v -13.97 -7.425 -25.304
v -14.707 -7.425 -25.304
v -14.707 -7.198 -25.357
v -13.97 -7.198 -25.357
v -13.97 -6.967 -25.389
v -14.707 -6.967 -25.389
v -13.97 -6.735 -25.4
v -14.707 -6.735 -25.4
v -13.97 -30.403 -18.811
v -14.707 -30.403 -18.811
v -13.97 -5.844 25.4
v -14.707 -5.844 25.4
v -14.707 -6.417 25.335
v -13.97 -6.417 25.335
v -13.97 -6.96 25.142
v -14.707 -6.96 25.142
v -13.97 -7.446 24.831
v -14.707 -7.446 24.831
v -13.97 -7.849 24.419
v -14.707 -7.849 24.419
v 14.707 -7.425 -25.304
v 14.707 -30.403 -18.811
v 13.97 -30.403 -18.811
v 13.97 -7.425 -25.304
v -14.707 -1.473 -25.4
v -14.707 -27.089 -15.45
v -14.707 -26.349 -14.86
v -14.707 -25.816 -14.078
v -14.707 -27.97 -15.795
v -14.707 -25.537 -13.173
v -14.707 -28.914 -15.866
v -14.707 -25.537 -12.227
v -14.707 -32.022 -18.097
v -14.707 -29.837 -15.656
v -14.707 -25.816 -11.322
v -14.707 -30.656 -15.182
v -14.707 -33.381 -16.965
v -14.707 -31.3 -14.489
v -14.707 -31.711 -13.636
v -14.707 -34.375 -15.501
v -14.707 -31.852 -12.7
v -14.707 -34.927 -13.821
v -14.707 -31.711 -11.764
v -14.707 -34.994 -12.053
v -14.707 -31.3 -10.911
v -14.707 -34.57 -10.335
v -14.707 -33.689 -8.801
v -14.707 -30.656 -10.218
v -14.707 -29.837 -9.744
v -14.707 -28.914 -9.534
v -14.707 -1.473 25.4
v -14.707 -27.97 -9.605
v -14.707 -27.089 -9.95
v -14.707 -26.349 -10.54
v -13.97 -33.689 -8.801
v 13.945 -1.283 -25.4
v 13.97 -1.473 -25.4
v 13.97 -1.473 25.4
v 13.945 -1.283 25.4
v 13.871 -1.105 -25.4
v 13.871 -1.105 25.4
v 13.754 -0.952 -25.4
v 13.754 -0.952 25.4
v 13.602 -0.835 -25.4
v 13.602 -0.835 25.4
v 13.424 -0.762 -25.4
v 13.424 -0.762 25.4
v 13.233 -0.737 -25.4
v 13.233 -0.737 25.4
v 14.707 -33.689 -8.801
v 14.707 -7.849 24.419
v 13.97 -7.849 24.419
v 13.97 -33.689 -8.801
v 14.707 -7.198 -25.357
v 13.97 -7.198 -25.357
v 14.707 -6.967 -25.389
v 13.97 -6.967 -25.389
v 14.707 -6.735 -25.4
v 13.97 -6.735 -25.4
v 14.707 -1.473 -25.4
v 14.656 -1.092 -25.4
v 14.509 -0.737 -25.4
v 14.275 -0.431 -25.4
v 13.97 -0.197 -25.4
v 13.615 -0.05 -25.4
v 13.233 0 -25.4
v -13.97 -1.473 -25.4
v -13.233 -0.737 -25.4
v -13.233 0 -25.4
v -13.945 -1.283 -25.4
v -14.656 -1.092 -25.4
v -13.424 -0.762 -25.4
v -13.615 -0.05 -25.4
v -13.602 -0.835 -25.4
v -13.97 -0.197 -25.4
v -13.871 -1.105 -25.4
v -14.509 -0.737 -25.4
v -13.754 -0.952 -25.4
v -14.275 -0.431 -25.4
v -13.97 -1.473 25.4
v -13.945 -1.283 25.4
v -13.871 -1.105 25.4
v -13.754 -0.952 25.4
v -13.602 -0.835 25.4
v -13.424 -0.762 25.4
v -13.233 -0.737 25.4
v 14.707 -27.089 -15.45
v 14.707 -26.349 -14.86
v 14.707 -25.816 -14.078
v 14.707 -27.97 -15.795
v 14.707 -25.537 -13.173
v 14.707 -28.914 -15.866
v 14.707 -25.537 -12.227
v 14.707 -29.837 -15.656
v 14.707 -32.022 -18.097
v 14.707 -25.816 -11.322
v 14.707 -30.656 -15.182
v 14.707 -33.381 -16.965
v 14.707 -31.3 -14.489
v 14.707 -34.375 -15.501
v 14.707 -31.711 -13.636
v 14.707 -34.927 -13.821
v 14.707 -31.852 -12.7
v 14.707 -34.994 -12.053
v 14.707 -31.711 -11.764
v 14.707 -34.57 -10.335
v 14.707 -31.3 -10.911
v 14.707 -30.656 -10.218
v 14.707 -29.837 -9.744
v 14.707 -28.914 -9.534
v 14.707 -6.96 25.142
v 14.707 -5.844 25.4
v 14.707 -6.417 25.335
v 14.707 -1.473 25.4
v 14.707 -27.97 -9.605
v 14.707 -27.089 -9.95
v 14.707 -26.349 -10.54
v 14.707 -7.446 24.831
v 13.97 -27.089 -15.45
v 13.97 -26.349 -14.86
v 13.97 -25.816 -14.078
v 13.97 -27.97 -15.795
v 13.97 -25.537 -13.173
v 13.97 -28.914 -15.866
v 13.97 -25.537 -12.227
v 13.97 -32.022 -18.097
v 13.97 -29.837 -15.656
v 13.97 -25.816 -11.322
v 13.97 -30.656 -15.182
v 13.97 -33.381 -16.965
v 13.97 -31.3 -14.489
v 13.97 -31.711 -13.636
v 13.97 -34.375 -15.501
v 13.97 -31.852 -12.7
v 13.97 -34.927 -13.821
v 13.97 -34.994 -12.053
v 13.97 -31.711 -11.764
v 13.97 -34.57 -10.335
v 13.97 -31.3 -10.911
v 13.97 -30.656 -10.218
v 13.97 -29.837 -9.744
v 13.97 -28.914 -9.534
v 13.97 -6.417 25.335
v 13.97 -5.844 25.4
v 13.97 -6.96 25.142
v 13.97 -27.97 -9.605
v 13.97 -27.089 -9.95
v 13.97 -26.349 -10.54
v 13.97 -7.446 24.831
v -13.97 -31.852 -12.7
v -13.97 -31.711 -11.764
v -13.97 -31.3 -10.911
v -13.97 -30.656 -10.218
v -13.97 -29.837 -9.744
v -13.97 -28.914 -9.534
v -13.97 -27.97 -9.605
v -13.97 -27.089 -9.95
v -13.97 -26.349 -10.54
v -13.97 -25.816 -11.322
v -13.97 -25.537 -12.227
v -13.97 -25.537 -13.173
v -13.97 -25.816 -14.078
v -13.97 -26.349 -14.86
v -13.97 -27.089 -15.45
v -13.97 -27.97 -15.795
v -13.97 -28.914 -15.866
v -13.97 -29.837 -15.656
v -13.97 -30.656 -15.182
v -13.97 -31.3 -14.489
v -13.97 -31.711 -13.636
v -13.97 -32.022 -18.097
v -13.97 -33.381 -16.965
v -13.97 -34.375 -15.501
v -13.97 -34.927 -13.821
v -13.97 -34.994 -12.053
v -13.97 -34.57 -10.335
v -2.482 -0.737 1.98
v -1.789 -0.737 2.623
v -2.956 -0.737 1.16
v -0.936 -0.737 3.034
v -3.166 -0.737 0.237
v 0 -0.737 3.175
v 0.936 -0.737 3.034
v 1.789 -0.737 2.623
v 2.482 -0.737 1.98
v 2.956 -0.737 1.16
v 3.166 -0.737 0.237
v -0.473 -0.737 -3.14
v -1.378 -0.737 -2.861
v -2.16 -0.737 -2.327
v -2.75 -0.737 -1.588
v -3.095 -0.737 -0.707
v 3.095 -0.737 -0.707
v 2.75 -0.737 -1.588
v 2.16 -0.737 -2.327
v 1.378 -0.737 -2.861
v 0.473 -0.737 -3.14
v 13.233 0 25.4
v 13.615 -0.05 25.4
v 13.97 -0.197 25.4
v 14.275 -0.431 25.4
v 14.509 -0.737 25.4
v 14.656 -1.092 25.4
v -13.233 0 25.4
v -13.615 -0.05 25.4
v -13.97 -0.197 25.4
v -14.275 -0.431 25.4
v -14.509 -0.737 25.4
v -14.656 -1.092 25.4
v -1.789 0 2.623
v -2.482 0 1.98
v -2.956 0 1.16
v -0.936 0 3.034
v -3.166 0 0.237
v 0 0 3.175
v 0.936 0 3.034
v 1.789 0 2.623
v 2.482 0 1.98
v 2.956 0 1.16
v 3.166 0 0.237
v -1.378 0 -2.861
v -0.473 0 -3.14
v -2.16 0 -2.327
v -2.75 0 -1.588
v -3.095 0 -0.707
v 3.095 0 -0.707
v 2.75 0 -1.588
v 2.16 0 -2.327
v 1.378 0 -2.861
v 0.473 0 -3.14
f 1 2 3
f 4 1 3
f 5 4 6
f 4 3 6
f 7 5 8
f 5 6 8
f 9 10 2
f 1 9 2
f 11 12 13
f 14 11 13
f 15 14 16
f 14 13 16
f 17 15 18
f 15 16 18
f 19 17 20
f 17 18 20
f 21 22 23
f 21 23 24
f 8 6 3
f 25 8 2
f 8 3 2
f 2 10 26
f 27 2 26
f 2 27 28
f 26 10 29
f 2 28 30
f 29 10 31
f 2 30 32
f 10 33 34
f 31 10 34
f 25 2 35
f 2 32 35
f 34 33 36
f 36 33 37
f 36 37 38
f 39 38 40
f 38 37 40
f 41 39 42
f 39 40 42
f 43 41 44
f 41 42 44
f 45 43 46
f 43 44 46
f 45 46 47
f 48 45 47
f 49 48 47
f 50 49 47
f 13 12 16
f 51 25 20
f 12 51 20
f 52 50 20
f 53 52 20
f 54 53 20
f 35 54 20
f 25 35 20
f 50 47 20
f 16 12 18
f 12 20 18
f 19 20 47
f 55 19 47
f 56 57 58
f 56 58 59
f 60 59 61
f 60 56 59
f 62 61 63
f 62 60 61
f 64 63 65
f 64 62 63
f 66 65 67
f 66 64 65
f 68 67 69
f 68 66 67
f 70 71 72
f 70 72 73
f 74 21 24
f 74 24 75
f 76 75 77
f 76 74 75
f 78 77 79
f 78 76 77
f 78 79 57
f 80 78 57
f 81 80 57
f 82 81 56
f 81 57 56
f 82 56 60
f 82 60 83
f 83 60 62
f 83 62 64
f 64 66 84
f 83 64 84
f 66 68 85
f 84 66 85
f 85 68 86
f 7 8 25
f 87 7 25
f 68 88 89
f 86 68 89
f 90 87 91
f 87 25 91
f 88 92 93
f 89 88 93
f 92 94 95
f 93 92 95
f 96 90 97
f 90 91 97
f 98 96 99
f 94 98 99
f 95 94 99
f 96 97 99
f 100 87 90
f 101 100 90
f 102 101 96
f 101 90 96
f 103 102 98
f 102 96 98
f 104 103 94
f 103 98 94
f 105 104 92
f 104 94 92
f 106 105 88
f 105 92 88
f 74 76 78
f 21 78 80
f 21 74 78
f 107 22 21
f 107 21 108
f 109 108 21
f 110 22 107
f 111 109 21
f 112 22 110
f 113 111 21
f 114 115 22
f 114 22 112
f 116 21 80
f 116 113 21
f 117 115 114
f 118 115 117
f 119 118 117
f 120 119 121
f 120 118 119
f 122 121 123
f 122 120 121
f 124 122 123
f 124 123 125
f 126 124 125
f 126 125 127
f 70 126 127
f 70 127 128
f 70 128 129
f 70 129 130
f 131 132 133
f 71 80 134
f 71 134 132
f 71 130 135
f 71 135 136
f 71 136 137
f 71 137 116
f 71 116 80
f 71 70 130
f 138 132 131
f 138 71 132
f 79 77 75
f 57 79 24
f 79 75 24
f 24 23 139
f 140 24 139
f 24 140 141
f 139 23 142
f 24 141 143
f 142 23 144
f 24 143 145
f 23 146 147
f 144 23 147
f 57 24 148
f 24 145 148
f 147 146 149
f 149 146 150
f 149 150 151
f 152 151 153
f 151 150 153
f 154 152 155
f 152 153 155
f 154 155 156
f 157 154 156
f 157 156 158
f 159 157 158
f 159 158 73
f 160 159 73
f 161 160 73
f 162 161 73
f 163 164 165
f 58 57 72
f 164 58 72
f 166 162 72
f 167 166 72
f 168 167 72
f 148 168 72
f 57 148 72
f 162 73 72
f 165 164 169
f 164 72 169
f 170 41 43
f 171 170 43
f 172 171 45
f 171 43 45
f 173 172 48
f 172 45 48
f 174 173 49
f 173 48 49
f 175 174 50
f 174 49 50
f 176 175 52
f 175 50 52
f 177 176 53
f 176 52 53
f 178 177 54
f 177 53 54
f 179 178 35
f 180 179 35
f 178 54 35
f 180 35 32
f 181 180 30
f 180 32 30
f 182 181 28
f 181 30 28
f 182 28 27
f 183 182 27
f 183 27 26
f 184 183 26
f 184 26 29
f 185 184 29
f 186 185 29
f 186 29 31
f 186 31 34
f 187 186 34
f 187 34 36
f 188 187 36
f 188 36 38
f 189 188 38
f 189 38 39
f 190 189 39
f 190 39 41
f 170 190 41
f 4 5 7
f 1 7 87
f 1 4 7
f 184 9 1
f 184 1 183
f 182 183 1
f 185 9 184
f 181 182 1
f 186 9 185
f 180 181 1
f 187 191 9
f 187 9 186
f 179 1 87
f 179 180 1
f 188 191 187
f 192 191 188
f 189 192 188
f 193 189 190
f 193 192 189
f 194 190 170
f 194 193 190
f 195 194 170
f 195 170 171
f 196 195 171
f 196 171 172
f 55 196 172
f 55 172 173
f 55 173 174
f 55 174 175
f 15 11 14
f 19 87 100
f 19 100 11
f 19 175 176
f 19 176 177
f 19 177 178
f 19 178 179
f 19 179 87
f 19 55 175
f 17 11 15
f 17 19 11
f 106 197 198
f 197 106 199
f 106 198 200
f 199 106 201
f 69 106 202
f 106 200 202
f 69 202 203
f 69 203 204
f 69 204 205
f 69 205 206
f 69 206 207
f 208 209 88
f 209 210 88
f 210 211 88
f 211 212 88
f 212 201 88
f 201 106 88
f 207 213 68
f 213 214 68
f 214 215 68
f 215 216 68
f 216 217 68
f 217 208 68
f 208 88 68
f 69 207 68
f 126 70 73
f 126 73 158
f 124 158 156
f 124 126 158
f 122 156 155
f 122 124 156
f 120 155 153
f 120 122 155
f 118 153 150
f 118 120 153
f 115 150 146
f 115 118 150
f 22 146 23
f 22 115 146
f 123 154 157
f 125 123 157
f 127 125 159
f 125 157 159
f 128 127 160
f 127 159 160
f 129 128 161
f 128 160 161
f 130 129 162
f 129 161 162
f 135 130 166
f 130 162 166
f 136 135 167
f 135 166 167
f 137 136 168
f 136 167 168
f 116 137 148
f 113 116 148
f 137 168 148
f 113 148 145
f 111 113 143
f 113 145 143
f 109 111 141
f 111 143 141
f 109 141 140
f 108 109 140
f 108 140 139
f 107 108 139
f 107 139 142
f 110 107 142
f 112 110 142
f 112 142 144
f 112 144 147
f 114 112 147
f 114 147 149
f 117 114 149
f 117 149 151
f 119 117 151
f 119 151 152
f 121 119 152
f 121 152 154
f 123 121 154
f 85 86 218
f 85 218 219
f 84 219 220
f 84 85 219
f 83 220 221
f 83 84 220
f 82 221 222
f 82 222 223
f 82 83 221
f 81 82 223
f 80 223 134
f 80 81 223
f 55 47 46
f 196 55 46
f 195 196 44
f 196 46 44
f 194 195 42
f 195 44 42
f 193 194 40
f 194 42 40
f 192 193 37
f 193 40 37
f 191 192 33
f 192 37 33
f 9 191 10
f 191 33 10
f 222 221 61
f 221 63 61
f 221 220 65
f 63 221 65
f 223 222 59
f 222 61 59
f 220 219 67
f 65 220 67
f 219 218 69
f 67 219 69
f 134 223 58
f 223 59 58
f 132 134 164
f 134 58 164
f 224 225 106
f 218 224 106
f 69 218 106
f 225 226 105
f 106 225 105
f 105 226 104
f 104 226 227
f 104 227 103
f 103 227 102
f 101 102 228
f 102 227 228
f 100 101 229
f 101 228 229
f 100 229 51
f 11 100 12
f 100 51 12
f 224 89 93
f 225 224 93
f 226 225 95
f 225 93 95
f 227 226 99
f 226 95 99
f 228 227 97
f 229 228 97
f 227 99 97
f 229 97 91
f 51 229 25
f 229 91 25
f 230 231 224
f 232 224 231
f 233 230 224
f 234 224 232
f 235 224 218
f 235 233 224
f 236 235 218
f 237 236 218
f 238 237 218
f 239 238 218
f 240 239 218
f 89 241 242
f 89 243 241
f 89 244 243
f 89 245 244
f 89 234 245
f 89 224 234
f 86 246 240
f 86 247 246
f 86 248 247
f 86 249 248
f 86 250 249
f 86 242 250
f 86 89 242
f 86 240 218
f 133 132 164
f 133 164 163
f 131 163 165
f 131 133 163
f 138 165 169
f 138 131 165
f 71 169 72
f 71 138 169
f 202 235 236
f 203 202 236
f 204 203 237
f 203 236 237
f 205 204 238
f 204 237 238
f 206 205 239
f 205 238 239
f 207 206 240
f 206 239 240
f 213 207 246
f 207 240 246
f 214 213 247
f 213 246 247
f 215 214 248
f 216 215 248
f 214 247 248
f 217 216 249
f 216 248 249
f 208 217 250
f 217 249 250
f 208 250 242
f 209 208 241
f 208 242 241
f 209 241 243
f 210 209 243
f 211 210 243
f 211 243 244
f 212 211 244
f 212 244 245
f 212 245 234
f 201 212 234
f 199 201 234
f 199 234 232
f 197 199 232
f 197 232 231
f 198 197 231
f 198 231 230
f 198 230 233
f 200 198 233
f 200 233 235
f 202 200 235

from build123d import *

# Parameters (mm, degrees)
SKETCH1_W                    = 27.94
SKETCH1_H                    = 50.8
BASE_FLANGE1_DEPTH           = 0.7366
EDGE_FLANGE1_STRIP_W         = 4.4196
EDGE_FLANGE1_STRIP_H         = 0.7366
EDGE_FLANGE1_STRIP_CUT_DEPTH = 50.8
EDGE_FLANGE1_DEPTH           = 50.8
EDGE_FLANGE1_START           = 0.7366
EDGE_FLANGE1_FLAT_DEPTH      = 0.7366
SKETCH12_R                   = 3.175
CUT_EXTRUDE1_DEPTH           = 53.317865417
CUT_EXTRUDE2_REACH           = 47.698
SKETCH13_R                   = 3.175


# Sheet-metal steps are written as plain solids
with BuildPart() as part:
    # Sketch1 → Base-Flange1 (new body)
    with BuildSketch(Plane(origin=(0, 0, 0), x_dir=(1, 0, 0), z_dir=(0, 1, 0))):
        Rectangle(SKETCH1_W, SKETCH1_H)
    extrude(amount=-BASE_FLANGE1_DEPTH)

    # Edge-Flange1 strip (across the edge) → Edge-Flange1 strip cut (cut)
    with BuildSketch(Plane(origin=(13.97, -0.7366, -25.4), x_dir=(-1, 0, 0), z_dir=(0, 0, 1))):
        with Locations((-1.4732, -0.3683)):
            Rectangle(EDGE_FLANGE1_STRIP_W, EDGE_FLANGE1_STRIP_H)
    edge_flange1_strip_cut = extrude(amount=EDGE_FLANGE1_STRIP_CUT_DEPTH, mode=Mode.SUBTRACT)

    # Edge-Flange1 bend section (across the edge) → Edge-Flange1 (add)
    with BuildSketch(Plane(origin=(13.97, -0.7366, -25.4), x_dir=(-1, 0, 0), z_dir=(0, 0, 1))):
        with BuildLine():
            Line((-0.7366, 0.7366), (0, 0.7366))
            ThreePointArc((0, 0.7366), (0.215745145, 0.215745145), (0.7366, 0))
            Line((0.7366, 0), (0.7366, -0.7366))
            ThreePointArc((0.7366, -0.7366), (-0.30510971, -0.30510971), (-0.7366, 0.7366))
        make_face()
    edge_flange1 = extrude(amount=EDGE_FLANGE1_DEPTH)

    # Edge-Flange1 profile (on flange) → Edge-Flange1 flat (add)
    with BuildSketch(Plane(origin=(13.97, -0.7366, 0), x_dir=(0, 0, 1), z_dir=(1, 0, 0)).offset(EDGE_FLANGE1_START)):
        with BuildLine():
            Line((24.419454366, 7.112682089), (-8.801364085, 32.952298674))
            ThreePointArc((-8.801364085, 32.952298674), (-14.680352055, 33.973299739), (-18.810680555, 29.666870915))
            Line((-18.810680555, 29.666870915), (-25.304272222, 6.688740937))
            ThreePointArc((-25.304272222, 6.688740937), (-25.375954237, 6.346667603), (-25.4, 5.997992571))
            Line((-25.4, 5.997992571), (-25.4, 0.7366))
            Line((-25.4, 0.7366), (25.4, 0.7366))
            Line((25.4, 0.7366), (25.4, 5.10776262))
            ThreePointArc((25.4, 5.10776262), (25.141733342, 6.223689568), (24.419454366, 7.112682089))
        make_face()
    edge_flange1_flat = extrude(amount=-EDGE_FLANGE1_FLAT_DEPTH)

    # Mirror1: Edge-Flange1 strip cut, Edge-Flange1, Edge-Flange1 flat across plane
    add(edge_flange1_strip_cut.mirror(Plane(origin=(0, 0, 0), x_dir=(0, 0, 1), z_dir=(1, 0, 0))), mode=Mode.SUBTRACT)
    add(edge_flange1.mirror(Plane(origin=(0, 0, 0), x_dir=(0, 0, 1), z_dir=(1, 0, 0))))
    add(edge_flange1_flat.mirror(Plane(origin=(0, 0, 0), x_dir=(0, 0, 1), z_dir=(1, 0, 0))))

    # Sketch12 → Cut-Extrude1 (cut, through all)
    with BuildSketch(Plane.ZY.offset(14.7066)):
        with Locations(Location((-12.7, -28.6766, 0), (0, 0, 270))):
            Circle(SKETCH12_R)
    extrude(amount=-CUT_EXTRUDE1_DEPTH, mode=Mode.SUBTRACT)

    # Sketch13 → Cut-Extrude2 (cut, up to next)
    with BuildSketch(Plane(origin=(0, 0, 0), x_dir=(1, 0, 0), z_dir=(0, 1, 0)), mode=Mode.PRIVATE) as cut_extrude2_sk1:
        with Locations(Location((0, 0, 0), (0, 0, 270))):
            Circle(SKETCH13_R)
    cut_extrude2_tool1 = extrude(cut_extrude2_sk1.sketch, amount=-CUT_EXTRUDE2_REACH, mode=Mode.PRIVATE) & part.part
    add(cut_extrude2_tool1.solids().sort_by_distance((0, 0, 0))[0], mode=Mode.SUBTRACT)


solid = part.part
